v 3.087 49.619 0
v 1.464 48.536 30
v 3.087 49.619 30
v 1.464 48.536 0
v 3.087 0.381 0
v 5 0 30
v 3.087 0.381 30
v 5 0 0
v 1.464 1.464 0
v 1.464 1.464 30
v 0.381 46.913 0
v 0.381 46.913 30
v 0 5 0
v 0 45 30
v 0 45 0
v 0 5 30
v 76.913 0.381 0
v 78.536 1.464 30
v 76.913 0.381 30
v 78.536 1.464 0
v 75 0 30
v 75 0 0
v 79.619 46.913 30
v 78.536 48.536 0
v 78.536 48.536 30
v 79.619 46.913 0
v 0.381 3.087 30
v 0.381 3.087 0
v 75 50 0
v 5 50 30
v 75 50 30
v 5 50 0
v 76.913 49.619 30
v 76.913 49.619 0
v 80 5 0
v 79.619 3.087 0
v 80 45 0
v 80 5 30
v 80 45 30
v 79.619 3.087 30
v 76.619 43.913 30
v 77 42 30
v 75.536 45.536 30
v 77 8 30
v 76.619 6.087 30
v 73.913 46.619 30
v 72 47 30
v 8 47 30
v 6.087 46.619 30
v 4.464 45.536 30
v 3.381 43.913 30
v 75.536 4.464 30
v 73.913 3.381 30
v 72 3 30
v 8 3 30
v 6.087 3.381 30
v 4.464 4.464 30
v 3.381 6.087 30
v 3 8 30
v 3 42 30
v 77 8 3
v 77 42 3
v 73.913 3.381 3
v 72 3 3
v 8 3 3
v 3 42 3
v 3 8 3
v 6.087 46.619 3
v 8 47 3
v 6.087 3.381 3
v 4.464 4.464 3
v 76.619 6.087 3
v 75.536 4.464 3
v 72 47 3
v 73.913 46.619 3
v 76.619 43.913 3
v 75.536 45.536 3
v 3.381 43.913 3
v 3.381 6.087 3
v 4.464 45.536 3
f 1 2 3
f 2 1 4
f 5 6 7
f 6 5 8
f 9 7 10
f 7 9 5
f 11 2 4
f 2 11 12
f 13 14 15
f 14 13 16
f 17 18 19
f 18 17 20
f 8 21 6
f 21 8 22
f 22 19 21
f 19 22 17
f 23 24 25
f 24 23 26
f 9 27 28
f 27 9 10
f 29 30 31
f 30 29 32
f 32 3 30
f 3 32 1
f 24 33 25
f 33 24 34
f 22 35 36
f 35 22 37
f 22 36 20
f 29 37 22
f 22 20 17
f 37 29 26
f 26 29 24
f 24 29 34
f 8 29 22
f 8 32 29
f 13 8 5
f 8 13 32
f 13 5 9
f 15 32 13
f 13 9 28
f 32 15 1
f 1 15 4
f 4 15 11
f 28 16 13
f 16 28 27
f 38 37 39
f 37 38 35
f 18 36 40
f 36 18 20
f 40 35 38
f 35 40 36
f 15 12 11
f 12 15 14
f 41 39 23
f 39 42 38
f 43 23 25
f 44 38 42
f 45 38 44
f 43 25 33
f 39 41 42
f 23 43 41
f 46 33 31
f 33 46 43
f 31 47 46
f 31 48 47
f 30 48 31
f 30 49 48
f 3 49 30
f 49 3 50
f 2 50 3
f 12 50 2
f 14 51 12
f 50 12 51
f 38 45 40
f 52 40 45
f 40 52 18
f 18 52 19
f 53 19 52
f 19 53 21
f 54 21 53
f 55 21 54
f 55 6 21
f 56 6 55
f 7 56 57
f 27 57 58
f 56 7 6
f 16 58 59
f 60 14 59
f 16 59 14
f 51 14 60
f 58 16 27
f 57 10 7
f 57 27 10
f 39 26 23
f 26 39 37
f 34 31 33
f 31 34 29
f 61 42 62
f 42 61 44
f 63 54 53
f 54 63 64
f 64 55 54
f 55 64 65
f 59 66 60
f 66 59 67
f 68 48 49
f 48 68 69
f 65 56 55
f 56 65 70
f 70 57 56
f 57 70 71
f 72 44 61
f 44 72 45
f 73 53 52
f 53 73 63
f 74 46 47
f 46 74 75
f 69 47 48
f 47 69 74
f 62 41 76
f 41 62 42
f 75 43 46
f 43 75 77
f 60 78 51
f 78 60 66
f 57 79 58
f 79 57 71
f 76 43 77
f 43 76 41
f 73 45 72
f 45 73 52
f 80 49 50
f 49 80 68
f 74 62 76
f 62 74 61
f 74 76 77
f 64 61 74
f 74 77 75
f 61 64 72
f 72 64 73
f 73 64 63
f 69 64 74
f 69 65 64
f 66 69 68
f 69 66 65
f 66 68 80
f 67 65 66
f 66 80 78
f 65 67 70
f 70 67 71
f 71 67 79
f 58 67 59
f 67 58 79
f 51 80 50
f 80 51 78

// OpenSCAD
DoosV(80,50,30,10);

module DoosV(width,depth,height,dia,dikte=3) {
 difference() {
  hull() {
   translate([dia/2,dia/2,0])cylinder(d=dia,h=height);
   translate([width-dia/2,dia/2,0])cylinder(d=dia,h=height);
   translate([width-dia/2,depth-dia/2,0])cylinder(d=dia,h=height);
   translate([dia/2,depth-dia/2,0])cylinder(d=dia,h=height);
  } 
  translate([0,0,dikte])hull() {
   translate([dia/2+dikte,dia/2+dikte,0])cylinder(d=dia,h=height);
   translate([width-dia/2-dikte,dia/2+dikte,0])cylinder(d=dia,h=height);
   translate([width-dia/2-dikte,depth-dia/2-dikte,0])cylinder(d=dia,h=height);
   translate([dia/2+dikte,depth-dia/2-dikte,0])cylinder(d=dia,h=height);
  } 
 }
}
